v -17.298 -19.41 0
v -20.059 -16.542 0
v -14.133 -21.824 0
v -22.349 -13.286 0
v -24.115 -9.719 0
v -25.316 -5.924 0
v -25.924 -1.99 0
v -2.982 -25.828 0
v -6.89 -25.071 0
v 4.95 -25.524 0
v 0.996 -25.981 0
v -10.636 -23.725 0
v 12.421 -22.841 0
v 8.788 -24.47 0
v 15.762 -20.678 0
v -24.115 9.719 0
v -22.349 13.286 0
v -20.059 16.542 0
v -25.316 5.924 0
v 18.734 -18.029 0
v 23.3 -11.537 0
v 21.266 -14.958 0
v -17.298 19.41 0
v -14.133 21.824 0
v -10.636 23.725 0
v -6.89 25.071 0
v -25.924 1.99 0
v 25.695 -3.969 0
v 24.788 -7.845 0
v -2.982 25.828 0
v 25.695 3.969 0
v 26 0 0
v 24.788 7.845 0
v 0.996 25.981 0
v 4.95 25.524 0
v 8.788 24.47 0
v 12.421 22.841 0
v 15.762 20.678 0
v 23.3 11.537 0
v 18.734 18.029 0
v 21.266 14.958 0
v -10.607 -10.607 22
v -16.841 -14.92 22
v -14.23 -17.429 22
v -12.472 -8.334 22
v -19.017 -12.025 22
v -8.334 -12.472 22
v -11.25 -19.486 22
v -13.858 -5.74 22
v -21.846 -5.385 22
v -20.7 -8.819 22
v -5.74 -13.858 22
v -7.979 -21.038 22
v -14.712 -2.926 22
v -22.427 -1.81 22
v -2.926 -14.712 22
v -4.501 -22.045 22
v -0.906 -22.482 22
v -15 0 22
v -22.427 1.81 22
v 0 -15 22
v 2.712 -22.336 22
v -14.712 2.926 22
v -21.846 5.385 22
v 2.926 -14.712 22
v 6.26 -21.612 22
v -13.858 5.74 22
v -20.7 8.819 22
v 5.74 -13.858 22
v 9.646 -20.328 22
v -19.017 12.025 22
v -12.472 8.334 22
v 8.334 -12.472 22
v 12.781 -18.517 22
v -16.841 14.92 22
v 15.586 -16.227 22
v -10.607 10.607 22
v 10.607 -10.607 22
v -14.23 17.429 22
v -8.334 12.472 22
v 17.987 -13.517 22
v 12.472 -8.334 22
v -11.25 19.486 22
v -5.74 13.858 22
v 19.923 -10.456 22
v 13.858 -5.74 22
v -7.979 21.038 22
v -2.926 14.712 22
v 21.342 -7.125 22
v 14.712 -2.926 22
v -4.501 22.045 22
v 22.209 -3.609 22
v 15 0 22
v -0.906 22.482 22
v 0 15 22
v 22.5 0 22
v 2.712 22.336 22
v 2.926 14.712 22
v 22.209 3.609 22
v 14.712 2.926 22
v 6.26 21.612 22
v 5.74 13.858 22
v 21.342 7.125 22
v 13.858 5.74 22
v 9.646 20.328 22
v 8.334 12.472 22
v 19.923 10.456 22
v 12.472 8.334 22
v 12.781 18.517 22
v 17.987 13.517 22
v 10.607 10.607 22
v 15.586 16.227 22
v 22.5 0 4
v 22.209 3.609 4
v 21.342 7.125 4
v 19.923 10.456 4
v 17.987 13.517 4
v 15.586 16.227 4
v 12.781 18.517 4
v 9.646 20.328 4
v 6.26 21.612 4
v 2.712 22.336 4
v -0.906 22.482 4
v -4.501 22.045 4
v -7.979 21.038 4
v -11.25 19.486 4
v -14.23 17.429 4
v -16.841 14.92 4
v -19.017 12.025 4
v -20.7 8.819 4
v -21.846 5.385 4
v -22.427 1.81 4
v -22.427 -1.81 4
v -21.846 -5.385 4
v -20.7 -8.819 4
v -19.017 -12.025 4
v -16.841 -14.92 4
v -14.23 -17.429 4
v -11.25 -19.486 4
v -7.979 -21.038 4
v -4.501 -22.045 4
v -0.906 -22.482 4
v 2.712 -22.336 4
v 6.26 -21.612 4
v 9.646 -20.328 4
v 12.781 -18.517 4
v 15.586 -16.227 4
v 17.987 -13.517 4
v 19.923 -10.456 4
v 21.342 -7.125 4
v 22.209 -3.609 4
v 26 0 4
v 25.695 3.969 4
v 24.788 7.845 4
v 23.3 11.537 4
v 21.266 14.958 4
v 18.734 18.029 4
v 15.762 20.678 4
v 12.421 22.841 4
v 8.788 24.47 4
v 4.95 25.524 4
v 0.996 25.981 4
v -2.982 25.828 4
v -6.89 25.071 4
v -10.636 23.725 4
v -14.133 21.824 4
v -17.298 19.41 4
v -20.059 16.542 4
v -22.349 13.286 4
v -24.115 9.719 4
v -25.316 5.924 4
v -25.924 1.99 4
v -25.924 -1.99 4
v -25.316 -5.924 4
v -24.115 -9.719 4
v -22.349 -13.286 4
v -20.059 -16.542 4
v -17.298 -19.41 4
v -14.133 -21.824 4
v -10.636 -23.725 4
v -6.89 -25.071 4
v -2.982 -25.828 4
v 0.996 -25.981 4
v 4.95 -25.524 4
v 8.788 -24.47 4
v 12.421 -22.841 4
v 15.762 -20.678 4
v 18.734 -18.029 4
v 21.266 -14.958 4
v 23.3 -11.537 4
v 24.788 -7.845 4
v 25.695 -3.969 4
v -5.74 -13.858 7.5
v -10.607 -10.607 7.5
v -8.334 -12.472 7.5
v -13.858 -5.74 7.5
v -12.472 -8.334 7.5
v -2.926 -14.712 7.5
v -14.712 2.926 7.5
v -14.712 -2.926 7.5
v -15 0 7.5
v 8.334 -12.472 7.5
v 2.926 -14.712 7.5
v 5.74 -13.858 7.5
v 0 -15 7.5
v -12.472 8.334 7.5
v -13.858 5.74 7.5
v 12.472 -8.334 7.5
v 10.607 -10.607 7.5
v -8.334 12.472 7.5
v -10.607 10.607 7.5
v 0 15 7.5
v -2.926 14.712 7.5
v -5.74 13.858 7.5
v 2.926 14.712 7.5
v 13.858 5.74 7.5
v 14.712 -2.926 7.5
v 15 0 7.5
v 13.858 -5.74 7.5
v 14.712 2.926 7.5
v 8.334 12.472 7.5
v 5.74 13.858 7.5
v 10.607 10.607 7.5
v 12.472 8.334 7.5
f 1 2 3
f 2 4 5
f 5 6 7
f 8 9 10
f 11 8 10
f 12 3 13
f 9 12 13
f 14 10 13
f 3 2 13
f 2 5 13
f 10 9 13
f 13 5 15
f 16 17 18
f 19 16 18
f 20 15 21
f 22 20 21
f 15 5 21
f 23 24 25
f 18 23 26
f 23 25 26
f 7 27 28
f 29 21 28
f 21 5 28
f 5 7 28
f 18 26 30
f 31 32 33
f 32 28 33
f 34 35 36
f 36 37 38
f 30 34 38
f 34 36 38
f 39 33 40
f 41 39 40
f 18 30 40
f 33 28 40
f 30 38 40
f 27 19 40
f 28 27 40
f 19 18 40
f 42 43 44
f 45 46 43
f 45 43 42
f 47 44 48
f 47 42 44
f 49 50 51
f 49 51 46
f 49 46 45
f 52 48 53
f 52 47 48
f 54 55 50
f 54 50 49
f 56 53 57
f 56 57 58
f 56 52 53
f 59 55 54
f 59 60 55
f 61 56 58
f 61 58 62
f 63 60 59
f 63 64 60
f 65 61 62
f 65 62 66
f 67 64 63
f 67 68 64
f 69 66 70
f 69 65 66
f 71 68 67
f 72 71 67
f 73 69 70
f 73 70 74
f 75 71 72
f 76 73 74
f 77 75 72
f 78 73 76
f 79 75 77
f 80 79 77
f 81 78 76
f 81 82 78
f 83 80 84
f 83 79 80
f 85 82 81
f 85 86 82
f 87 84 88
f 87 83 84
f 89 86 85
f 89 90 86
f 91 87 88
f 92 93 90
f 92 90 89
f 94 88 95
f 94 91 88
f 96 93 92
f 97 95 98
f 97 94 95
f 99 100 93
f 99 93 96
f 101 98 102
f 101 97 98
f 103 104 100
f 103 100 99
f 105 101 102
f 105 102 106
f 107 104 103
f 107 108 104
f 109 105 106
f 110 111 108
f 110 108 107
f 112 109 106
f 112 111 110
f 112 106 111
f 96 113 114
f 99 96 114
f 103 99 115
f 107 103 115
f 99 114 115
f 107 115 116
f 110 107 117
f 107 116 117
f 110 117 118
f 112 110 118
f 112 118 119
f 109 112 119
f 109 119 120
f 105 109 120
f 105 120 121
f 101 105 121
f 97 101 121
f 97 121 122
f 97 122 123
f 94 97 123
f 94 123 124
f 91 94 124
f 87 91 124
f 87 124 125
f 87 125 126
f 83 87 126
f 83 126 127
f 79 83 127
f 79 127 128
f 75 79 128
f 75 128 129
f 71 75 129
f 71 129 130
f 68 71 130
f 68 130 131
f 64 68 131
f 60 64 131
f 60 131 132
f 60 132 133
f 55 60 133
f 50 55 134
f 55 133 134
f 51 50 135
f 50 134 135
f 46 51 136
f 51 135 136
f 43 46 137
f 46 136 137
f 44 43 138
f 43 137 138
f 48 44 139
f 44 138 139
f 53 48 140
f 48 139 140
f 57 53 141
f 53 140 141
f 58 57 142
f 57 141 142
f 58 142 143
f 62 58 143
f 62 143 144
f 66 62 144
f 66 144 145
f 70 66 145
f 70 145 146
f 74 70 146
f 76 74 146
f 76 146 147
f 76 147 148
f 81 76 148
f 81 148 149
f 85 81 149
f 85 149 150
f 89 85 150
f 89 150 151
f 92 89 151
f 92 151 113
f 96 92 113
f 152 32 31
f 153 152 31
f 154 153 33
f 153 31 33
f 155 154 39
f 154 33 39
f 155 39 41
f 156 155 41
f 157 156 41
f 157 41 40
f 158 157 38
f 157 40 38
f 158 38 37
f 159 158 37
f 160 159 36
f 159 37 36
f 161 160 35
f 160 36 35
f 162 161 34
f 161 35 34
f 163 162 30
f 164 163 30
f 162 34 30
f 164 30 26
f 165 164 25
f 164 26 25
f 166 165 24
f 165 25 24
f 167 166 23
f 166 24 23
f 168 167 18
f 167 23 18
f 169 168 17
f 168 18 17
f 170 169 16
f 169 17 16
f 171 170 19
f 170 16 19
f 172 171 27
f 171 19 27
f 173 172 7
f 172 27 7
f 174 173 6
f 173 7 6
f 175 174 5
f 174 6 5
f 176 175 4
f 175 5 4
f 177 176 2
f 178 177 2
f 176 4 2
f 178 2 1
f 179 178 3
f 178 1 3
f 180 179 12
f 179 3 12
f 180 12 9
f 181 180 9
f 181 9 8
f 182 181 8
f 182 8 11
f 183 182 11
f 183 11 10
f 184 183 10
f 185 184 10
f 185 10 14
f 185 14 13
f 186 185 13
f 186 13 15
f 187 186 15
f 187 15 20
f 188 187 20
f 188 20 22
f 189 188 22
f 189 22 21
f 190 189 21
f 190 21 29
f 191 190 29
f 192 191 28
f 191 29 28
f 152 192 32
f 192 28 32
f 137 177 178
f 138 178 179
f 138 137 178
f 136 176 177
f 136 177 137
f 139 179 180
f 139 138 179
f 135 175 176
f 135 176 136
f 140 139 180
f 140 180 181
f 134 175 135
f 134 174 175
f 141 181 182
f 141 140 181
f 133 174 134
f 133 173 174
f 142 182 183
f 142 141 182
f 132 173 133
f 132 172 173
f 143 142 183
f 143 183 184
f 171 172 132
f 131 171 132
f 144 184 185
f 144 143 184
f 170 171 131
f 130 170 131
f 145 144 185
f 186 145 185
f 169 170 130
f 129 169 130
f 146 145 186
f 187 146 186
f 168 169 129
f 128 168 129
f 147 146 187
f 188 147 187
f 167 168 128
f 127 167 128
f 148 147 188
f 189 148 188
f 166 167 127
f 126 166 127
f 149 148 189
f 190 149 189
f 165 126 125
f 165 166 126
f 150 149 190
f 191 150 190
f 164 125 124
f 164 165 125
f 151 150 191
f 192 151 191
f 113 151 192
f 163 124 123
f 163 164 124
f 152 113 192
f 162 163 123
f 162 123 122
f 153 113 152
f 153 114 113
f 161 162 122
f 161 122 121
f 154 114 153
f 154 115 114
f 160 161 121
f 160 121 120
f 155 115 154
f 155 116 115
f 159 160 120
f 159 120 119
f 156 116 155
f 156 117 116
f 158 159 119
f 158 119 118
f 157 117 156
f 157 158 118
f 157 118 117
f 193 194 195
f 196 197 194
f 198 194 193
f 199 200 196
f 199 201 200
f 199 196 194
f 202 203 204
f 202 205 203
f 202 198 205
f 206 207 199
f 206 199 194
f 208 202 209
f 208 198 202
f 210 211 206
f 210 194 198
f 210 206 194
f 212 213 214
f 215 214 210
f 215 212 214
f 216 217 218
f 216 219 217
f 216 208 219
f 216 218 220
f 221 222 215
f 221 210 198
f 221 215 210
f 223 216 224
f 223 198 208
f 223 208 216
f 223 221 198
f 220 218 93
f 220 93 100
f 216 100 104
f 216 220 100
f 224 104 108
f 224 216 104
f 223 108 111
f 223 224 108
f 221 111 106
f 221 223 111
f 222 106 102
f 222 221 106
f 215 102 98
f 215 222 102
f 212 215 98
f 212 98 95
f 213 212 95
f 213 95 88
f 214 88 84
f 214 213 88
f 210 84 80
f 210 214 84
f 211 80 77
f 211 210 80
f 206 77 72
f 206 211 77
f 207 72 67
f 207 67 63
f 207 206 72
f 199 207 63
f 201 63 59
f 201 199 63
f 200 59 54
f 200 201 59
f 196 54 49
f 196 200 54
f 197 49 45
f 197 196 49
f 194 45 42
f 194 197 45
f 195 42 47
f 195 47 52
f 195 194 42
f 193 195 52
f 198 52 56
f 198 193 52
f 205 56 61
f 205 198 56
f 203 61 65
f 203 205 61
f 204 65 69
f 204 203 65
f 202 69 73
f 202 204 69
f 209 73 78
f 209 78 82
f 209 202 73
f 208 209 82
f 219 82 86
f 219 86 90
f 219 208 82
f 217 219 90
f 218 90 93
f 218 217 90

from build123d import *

# Parameters (mm, degrees)
F0_R     = 26
F0_R_2   = 22.5
F1_DEPTH = 4
F2_DEPTH = 22
F3_T     = -7.5


with BuildPart() as f1:
    # F0 (on Top) → F1 (new body)
    with BuildSketch(Plane.XY):
        Circle(F0_R)
        Circle(F0_R_2, mode=Mode.SUBTRACT)
    extrude(amount=F1_DEPTH)

    # F0 (on Top) → F2 (join)
    with BuildSketch(Plane.XY):
        Circle(F0_R_2)
    extrude(amount=F2_DEPTH)

    # F3
    f3_openings = [f1.faces().sort_by_distance(p)[0] for p in [
        (0, 0, 22),
    ]]
    offset(amount=F3_T, openings=f3_openings)


solid = f1.part
